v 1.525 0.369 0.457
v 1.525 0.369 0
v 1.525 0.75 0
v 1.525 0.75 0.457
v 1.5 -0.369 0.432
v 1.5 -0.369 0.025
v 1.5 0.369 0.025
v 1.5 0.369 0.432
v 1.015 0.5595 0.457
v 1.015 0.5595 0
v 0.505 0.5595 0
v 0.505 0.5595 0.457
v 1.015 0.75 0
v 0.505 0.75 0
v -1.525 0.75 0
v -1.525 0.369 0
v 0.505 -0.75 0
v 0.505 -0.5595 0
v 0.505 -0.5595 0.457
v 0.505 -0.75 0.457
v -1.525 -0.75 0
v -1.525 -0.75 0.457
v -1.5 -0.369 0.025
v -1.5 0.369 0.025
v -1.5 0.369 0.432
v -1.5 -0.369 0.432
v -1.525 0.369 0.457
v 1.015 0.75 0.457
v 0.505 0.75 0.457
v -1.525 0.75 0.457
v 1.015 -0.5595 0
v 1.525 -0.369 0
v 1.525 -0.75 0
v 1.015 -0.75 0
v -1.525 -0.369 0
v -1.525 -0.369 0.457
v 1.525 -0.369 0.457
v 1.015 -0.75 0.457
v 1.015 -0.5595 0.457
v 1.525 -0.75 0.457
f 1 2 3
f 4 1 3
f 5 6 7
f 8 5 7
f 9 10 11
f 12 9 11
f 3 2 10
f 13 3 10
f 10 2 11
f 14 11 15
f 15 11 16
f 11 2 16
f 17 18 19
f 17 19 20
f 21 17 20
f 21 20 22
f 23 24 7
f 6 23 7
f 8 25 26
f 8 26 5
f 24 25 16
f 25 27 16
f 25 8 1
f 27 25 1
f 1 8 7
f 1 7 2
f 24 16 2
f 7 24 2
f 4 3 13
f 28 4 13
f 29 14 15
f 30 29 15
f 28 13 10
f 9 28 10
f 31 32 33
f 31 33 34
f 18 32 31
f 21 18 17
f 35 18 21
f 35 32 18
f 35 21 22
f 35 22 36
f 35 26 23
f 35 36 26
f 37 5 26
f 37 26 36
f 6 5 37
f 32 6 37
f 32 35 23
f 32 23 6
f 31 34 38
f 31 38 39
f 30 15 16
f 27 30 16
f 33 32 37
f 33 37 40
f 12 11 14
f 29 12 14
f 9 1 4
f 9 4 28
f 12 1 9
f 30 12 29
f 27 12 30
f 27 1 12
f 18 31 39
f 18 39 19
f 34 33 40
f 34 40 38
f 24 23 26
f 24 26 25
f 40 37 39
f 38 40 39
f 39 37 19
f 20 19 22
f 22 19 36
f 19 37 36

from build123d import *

# Parameters (mm, degrees)
PAD001_DEPTH = 0.457
SKETCH_W     = 3
SKETCH_H     = 0.738
PAD_DEPTH    = 0.407


with BuildPart() as pad001:
    # Sketch001 → Pad001 (new body)
    with BuildSketch(Plane.XY):
        Polygon((-1.525, -0.369), (1.525, -0.369), (1.525, -0.75), (1.015, -0.75), (1.015, -0.5595), (0.505, -0.5595), (0.505, -0.75), (-1.525, -0.75), align=None)
    extrude(amount=PAD001_DEPTH)


with BuildPart() as part_mirroring:
    # Part__Mirroring: instance of Pad001
    add(pad001.part.mirror(Plane(origin=(0, 0, 0), x_dir=(1, 0, 0), z_dir=(0, 1, 0))))


with BuildPart() as body:
    # Sketch → Pad (new body)
    with BuildSketch(Plane.XY.offset(0.025)):
        Rectangle(SKETCH_W, SKETCH_H)
    extrude(amount=PAD_DEPTH)


with BuildPart() as r_shunt_vishay_wskw0612:
    # Fusion base: copy of Pad001
    add(pad001.part)

    # Fusion: union Part__Mirroring, Body
    add(part_mirroring.part)
    add(body.part)


solid = r_shunt_vishay_wskw0612.part
